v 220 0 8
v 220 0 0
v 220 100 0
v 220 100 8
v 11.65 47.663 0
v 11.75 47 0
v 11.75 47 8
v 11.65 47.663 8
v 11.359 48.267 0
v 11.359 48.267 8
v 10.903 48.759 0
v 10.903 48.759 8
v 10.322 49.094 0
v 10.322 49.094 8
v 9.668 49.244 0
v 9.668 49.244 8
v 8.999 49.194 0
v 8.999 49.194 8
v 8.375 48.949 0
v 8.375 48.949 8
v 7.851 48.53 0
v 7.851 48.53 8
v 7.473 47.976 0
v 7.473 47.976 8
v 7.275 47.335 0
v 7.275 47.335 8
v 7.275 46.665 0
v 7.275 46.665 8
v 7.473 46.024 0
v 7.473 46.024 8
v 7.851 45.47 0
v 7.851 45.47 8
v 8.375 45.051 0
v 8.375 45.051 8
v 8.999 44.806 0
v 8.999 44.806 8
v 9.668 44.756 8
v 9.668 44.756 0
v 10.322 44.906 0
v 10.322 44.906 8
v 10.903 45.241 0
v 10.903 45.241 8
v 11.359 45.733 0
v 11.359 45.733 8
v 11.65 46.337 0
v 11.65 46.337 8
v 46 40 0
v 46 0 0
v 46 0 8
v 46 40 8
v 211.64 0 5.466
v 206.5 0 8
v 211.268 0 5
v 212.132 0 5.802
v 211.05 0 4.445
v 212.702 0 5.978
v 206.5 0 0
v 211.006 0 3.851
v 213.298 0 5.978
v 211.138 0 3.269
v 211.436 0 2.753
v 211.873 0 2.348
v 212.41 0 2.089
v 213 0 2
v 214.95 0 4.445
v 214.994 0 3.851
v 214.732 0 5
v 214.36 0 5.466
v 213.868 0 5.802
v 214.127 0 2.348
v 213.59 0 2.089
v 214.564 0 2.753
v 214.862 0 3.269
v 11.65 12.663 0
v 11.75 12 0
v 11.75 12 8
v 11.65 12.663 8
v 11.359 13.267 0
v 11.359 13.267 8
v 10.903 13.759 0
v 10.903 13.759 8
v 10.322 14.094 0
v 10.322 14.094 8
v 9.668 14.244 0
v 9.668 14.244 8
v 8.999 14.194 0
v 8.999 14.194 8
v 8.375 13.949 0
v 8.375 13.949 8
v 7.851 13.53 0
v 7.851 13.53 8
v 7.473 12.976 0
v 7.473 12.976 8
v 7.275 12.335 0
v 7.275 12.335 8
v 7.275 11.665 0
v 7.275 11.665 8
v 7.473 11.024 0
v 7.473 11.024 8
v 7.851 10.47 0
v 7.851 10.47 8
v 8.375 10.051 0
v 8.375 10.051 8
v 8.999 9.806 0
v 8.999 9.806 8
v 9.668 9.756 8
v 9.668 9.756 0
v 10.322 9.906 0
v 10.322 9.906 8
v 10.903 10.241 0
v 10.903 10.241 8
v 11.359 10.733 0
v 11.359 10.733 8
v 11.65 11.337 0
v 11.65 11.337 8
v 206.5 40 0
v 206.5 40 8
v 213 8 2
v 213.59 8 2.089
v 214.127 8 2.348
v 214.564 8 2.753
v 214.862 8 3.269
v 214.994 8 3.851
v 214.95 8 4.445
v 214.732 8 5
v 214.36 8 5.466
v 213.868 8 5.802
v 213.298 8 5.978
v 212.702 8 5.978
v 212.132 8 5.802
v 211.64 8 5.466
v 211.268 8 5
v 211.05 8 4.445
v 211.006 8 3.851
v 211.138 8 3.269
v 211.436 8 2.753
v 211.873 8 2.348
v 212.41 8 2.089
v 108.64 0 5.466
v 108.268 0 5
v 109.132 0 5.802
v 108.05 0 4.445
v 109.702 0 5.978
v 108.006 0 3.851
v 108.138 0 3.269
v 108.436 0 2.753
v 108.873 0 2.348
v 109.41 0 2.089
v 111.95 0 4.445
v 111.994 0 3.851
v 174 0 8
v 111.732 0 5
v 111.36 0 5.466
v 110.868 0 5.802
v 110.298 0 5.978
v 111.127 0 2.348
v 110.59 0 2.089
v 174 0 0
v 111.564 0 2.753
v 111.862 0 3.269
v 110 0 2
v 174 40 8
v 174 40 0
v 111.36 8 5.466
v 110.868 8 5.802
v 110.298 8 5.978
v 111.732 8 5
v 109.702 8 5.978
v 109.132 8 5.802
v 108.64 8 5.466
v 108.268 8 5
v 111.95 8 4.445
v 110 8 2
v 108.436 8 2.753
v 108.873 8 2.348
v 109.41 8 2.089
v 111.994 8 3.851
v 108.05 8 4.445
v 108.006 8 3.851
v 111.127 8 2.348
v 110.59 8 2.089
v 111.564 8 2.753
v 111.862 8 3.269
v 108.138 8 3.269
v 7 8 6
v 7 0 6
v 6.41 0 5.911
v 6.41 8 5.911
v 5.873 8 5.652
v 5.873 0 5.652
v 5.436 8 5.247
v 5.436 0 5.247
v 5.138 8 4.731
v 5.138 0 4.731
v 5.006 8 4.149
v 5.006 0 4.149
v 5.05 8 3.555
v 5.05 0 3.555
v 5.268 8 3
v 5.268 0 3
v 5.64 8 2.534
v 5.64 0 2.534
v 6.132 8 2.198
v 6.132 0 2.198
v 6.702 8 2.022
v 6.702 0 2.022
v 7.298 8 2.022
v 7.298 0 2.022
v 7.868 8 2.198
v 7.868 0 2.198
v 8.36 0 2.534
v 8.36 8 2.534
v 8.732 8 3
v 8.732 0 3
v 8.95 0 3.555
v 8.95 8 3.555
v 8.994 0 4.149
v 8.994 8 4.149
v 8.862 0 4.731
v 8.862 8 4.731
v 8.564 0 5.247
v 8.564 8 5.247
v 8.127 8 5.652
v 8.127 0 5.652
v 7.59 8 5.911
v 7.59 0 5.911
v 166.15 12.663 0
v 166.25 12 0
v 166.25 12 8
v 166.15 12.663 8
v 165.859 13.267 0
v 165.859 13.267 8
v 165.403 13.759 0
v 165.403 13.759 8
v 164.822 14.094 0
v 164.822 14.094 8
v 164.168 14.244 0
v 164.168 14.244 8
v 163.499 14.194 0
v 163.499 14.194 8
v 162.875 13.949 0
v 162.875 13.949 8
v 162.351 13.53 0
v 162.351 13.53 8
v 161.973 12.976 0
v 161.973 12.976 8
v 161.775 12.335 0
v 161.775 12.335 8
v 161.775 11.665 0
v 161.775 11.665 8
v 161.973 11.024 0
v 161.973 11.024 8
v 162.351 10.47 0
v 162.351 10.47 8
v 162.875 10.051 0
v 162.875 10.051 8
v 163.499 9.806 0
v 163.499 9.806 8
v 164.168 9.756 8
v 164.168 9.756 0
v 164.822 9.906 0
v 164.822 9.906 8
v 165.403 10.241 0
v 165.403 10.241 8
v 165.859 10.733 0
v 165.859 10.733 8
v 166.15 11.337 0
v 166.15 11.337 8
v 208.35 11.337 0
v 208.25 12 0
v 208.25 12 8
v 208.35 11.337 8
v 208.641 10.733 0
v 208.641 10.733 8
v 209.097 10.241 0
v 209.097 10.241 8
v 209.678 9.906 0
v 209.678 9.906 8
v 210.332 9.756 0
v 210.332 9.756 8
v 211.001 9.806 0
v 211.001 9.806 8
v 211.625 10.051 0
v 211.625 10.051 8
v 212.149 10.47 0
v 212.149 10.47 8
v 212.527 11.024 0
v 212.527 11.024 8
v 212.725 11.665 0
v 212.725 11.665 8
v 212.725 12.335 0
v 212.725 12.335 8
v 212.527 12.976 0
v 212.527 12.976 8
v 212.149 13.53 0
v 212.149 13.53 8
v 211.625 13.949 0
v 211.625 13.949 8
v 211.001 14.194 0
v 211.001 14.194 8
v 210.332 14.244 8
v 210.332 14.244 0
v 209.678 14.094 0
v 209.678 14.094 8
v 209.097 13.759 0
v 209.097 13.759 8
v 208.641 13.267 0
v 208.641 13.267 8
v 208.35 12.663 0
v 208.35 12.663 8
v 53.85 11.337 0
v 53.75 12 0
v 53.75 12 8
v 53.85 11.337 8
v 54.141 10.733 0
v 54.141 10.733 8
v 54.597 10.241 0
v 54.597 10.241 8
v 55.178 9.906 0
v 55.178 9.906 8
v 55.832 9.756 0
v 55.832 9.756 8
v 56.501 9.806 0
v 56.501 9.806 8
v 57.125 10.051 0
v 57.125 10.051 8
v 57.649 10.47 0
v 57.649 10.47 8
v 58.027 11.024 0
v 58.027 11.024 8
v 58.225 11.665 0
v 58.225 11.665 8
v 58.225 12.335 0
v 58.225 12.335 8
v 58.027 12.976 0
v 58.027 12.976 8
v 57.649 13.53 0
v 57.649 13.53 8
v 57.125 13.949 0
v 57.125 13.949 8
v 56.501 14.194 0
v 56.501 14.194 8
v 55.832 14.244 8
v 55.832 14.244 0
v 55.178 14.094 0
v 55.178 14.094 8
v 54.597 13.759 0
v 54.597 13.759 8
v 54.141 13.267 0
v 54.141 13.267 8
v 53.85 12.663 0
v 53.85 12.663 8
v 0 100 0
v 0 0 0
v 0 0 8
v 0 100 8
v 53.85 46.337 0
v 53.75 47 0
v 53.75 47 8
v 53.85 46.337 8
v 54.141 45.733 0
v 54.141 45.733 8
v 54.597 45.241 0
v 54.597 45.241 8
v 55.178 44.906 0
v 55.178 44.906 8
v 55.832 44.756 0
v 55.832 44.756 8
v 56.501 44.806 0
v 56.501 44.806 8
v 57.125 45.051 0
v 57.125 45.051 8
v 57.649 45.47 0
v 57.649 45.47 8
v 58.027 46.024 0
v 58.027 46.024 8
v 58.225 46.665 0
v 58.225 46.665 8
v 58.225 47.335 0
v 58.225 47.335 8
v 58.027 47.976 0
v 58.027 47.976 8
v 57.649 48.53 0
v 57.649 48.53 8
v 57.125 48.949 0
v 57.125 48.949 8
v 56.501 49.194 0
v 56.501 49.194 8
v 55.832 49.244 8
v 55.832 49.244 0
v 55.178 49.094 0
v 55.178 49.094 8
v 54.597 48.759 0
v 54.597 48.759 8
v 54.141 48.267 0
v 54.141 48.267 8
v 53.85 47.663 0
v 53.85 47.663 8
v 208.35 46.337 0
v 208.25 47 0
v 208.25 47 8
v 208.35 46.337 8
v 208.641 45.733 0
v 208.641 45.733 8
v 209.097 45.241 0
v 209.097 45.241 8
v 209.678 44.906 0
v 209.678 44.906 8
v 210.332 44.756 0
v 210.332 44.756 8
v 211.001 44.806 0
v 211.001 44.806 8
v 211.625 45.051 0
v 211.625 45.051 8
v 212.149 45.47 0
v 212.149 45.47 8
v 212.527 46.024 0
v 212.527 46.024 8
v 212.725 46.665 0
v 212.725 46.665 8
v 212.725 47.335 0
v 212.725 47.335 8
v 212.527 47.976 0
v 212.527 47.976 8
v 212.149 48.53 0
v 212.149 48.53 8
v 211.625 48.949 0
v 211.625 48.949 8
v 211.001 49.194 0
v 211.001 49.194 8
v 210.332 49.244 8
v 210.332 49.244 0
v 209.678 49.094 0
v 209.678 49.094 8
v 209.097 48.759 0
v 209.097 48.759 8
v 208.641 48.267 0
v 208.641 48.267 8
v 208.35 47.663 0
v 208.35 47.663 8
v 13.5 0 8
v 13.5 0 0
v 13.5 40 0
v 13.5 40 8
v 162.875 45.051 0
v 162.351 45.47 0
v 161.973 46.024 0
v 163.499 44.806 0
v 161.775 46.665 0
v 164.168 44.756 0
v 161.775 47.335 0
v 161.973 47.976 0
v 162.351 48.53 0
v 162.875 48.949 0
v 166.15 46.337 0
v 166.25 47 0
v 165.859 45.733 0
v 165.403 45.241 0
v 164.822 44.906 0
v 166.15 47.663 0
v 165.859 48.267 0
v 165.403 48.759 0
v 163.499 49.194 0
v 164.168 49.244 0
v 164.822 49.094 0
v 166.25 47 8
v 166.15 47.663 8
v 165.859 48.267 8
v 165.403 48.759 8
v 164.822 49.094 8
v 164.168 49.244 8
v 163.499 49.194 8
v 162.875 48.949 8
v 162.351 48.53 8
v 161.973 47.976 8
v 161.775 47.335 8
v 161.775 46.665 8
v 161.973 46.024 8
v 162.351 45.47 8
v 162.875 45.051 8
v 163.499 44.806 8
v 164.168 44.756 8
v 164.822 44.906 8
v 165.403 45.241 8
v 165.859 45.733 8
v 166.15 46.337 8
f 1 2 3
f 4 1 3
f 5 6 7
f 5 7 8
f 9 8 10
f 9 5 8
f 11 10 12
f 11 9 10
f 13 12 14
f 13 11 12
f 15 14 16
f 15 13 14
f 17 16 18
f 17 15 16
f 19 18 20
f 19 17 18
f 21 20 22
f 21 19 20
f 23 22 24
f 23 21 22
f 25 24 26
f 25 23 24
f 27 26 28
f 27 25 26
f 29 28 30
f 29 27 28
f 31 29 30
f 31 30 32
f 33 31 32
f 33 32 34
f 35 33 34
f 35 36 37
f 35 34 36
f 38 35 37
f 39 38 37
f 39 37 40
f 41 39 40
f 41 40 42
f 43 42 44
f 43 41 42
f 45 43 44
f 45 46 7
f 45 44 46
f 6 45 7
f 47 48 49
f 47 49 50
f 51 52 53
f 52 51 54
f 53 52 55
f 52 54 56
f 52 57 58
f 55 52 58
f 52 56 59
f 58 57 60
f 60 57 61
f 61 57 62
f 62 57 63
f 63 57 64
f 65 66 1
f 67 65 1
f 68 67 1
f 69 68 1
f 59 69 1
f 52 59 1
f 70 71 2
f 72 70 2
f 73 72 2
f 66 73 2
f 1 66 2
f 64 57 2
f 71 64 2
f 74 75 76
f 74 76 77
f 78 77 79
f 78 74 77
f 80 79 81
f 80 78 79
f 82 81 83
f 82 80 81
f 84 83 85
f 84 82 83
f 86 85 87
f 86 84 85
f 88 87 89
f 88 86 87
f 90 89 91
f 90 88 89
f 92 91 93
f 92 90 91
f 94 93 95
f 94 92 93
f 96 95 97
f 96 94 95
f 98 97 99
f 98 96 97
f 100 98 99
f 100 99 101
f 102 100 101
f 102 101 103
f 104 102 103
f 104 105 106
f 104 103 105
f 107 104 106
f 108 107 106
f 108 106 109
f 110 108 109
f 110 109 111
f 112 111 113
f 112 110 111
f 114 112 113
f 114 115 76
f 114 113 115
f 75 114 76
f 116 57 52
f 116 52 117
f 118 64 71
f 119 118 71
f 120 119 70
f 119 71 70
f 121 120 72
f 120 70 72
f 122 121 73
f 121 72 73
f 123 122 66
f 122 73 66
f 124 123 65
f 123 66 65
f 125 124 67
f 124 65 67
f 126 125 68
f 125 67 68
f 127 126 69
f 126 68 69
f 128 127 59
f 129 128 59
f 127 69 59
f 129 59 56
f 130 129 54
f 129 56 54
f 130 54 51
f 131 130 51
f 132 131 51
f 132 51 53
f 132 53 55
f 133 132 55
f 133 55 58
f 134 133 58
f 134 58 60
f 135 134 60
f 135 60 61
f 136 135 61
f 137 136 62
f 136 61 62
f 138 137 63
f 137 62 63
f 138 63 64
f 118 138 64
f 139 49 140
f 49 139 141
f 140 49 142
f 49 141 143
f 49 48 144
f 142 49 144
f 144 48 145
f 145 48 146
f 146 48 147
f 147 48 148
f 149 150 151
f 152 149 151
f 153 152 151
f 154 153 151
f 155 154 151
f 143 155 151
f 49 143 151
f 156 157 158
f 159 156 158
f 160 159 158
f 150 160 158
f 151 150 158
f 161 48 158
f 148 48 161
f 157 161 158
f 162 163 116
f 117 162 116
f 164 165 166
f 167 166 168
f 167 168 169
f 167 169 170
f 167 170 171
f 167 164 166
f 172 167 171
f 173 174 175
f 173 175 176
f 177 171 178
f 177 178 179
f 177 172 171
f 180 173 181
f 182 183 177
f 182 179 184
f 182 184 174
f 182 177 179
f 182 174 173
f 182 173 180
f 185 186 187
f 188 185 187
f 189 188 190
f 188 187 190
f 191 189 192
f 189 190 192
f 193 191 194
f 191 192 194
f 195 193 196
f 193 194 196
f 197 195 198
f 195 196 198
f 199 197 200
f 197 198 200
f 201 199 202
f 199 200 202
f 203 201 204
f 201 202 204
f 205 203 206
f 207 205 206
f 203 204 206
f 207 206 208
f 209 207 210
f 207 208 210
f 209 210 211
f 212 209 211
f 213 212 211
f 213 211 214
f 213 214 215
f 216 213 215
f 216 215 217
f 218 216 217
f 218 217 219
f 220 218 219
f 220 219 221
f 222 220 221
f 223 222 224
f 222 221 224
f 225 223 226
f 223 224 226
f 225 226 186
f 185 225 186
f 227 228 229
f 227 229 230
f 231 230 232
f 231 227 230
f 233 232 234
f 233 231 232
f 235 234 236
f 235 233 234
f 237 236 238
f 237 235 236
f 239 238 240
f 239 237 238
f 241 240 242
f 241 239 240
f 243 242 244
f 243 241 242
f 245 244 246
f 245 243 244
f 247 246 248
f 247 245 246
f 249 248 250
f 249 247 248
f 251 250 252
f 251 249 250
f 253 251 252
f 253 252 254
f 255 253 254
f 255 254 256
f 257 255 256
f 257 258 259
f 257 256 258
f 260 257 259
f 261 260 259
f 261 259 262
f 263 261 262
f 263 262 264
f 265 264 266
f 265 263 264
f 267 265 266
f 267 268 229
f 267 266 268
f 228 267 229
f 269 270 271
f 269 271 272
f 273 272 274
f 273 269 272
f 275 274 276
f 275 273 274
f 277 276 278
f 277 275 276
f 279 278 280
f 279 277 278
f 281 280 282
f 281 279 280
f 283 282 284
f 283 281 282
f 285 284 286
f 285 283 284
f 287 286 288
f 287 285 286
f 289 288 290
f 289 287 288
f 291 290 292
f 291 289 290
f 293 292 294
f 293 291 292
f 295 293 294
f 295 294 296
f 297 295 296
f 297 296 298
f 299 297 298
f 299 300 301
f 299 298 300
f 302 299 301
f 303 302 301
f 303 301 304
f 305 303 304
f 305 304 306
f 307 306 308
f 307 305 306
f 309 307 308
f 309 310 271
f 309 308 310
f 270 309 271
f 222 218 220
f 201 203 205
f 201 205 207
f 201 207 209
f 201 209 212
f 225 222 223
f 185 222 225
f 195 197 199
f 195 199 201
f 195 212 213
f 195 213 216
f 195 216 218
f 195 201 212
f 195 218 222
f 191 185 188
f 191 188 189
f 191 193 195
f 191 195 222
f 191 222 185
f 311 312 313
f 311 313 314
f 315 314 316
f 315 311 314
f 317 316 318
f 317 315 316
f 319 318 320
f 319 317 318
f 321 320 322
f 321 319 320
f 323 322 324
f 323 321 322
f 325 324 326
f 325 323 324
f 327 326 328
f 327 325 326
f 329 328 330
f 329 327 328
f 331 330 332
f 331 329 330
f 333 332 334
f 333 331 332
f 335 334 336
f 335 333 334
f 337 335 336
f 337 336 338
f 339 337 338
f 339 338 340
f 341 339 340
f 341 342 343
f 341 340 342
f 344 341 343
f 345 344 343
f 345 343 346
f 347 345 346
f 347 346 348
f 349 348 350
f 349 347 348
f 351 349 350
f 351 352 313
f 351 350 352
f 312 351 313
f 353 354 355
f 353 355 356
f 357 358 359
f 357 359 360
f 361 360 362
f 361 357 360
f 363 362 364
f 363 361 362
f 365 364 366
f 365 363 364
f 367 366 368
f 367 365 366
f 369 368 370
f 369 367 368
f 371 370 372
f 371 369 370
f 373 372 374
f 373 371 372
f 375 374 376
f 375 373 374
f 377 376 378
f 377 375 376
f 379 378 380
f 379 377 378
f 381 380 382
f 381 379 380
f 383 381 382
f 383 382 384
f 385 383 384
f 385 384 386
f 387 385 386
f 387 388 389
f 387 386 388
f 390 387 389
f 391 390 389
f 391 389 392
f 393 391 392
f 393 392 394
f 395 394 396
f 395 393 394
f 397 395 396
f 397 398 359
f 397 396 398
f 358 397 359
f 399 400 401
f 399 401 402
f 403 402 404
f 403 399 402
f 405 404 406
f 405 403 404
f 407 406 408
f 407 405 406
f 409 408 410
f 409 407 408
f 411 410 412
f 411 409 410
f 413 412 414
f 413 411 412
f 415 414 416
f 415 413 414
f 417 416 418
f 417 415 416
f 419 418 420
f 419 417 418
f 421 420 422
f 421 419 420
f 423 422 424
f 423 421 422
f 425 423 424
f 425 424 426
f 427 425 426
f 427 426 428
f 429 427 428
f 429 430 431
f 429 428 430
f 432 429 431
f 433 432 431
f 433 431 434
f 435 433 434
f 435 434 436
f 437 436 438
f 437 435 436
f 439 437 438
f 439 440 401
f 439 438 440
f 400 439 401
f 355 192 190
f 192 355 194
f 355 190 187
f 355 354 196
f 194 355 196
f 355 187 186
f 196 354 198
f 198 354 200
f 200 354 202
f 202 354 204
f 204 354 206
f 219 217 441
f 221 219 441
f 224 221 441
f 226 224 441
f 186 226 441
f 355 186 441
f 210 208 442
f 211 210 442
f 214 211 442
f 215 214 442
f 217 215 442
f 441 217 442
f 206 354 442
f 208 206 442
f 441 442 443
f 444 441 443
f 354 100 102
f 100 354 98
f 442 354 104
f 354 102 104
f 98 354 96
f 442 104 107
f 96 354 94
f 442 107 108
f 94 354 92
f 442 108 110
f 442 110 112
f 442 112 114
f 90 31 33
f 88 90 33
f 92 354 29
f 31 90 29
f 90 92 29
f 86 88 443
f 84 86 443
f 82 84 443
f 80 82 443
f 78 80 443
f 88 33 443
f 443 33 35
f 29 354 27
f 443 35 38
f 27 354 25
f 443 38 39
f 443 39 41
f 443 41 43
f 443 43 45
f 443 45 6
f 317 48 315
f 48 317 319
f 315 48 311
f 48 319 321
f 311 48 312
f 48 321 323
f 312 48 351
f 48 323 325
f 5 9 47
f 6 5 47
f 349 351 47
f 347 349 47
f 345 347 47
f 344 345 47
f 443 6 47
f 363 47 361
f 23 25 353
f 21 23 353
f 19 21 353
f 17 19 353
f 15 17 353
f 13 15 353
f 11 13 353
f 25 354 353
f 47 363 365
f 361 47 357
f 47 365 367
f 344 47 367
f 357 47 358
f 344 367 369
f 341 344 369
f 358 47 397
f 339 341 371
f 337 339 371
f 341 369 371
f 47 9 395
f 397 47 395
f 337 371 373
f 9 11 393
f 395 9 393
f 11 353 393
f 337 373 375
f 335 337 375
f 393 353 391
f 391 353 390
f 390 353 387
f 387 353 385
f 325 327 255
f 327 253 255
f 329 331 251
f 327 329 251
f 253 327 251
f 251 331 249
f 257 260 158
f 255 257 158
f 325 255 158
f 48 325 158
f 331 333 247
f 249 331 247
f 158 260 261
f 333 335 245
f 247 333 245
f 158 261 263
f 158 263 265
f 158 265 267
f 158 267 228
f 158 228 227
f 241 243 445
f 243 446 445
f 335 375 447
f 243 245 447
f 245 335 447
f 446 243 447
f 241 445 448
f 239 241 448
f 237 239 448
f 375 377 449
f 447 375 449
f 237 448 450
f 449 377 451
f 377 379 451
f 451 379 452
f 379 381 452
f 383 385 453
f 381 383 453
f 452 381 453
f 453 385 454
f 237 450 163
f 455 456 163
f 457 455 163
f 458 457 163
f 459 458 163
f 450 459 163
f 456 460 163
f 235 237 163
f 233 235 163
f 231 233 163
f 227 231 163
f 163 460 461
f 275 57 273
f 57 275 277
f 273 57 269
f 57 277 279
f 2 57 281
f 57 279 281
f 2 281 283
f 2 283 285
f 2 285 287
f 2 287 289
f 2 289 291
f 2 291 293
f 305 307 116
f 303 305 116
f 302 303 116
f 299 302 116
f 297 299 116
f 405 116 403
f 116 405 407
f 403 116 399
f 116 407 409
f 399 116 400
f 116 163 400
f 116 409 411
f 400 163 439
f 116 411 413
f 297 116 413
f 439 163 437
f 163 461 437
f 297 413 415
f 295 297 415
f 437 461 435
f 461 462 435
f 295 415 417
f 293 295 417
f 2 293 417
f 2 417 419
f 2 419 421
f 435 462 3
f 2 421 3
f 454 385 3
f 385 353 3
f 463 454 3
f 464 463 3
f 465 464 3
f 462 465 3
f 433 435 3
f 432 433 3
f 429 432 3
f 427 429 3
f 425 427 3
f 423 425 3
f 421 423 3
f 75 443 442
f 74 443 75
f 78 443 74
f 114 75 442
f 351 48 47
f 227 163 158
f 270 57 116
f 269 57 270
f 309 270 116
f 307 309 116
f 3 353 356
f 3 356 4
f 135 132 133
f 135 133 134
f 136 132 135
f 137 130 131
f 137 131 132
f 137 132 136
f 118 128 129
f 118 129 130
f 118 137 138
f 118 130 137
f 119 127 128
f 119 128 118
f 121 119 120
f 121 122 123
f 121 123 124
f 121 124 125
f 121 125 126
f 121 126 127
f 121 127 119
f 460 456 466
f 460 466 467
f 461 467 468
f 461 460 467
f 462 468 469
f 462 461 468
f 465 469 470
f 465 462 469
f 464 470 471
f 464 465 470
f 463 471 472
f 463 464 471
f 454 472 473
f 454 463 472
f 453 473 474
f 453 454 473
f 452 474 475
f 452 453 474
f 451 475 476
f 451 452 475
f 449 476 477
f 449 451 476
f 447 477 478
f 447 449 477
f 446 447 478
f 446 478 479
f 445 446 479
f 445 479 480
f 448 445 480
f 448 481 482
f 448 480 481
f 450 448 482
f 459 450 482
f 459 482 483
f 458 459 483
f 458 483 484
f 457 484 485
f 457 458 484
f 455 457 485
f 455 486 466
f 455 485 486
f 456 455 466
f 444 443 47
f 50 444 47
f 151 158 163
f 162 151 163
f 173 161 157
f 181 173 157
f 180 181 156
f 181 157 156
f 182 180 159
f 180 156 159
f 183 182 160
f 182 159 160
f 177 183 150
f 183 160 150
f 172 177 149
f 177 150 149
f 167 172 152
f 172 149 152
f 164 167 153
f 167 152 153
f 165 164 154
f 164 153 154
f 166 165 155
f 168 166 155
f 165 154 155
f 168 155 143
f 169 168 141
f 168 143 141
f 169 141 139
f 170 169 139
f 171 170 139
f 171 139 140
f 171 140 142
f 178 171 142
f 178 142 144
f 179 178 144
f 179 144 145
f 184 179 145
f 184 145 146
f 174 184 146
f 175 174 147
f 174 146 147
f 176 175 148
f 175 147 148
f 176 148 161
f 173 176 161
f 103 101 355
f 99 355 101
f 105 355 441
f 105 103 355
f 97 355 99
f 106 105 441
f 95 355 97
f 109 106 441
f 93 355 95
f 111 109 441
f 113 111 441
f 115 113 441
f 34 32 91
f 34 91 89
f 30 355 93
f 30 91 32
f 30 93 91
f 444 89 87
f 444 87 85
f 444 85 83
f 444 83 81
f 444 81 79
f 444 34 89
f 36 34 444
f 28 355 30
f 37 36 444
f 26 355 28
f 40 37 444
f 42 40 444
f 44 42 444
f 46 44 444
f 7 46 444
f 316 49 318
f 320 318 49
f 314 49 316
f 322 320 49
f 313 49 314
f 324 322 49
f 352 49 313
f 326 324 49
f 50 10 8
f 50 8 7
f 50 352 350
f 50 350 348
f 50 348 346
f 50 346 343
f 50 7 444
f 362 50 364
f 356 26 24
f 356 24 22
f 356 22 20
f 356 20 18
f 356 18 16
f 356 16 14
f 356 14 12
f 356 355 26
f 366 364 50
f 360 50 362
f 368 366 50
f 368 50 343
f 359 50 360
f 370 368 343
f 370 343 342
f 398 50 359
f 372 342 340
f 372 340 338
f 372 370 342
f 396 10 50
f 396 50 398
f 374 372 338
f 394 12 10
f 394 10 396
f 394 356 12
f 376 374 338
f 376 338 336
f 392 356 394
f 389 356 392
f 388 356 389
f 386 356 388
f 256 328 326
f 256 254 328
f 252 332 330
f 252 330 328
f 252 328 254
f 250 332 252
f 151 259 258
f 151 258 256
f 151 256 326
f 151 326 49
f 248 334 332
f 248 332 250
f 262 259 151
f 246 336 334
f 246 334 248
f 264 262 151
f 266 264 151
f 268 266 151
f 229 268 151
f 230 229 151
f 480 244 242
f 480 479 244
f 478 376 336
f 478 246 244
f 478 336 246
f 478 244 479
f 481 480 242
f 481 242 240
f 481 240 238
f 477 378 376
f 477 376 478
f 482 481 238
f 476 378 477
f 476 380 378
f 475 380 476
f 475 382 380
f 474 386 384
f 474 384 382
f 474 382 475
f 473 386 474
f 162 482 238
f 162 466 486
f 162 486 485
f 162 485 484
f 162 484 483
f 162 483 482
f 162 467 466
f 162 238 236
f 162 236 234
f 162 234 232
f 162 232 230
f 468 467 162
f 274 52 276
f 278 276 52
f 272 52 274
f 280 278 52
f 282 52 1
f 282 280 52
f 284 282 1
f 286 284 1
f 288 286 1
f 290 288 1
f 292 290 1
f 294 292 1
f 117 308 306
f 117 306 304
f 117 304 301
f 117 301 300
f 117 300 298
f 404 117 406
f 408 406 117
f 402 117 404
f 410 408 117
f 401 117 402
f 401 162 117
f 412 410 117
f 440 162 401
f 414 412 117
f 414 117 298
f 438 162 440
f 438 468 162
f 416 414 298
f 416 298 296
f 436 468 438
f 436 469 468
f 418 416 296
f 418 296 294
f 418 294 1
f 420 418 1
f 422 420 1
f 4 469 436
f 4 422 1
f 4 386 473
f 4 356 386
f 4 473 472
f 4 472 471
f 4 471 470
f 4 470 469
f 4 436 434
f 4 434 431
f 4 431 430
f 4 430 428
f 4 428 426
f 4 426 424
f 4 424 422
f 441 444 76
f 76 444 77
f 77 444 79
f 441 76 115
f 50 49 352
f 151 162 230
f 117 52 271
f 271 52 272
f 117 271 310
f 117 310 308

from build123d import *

# Parameters (mm, degrees)
ESQUISSE1_W                  = 220
ESQUISSE1_H                  = 100
BOSS_EXTRU_1_DEPTH           = 8
ESQUISSE2_R                  = 2
ENL_V_MAT_EXTRU_1_DEPTH      = 8
ENL_V_MAT_EXTRU_6_DEPTH      = 242.793300155
ENL_V_MAT_EXTRU_6_DEPTH_BACK = 242.793300155
ESQUISSE8_W                  = 32.5
ESQUISSE8_H                  = 40
ENL_V_MAT_EXTRU_8_DEPTH      = 242.793300155
ENL_V_MAT_EXTRU_8_DEPTH_BACK = 242.793300155
ESQUISSE10_R                 = 2.25


with BuildPart() as part:
    # Esquisse1 → Boss.-Extru.1 (new body)
    with BuildSketch(Plane.XY):
        with Locations((110, 50)):
            Rectangle(ESQUISSE1_W, ESQUISSE1_H)
    extrude(amount=BOSS_EXTRU_1_DEPTH)

    # Esquisse2 → Enlèv. mat.-Extru.1 (cut)
    with BuildSketch(Plane.XZ):
        with Locations(Location((110, 4, 0), (0, 0, 270))):
            Circle(ESQUISSE2_R)
        with Locations(Location((213, 4, 0), (0, 0, 270))):
            Circle(ESQUISSE2_R)
        with Locations(Location((7, 4, 0), (0, 0, 90))):
            Circle(ESQUISSE2_R)
    extrude(amount=-ENL_V_MAT_EXTRU_1_DEPTH, mode=Mode.SUBTRACT)

    # Esquisse8 → Enlèv. mat.-Extru.6 (cut, two sides: drawn at the far end of the back side and taken through both)
    with BuildSketch(Plane.XY.offset(8).offset(-ENL_V_MAT_EXTRU_6_DEPTH_BACK)):
        with Locations((190.25, 20)):
            Rectangle(ESQUISSE8_W, ESQUISSE8_H)
        with Locations((29.75, 20)):
            Rectangle(ESQUISSE8_W, ESQUISSE8_H)
    extrude(amount=ENL_V_MAT_EXTRU_6_DEPTH + ENL_V_MAT_EXTRU_6_DEPTH_BACK, mode=Mode.SUBTRACT)

    # Esquisse10 → Enlèv. mat.-Extru.8 (cut, two sides: drawn at the far end of the back side and taken through both)
    with BuildSketch(Plane.XY.offset(8).offset(-ENL_V_MAT_EXTRU_8_DEPTH_BACK)):
        with Locations((9.5, 12)):
            Circle(ESQUISSE10_R)
        with Locations((9.5, 47)):
            Circle(ESQUISSE10_R)
        with Locations(Location((210.5, 47, 0), (0, 0, 180))):
            Circle(ESQUISSE10_R)
        with Locations(Location((210.5, 12, 0), (0, 0, 180))):
            Circle(ESQUISSE10_R)
        with Locations(Location((56, 47, 0), (0, 0, 180))):
            Circle(ESQUISSE10_R)
        with Locations(Location((56, 12, 0), (0, 0, 180))):
            Circle(ESQUISSE10_R)
        with Locations((164, 12)):
            Circle(ESQUISSE10_R)
        with Locations((164, 47)):
            Circle(ESQUISSE10_R)
    extrude(amount=ENL_V_MAT_EXTRU_8_DEPTH + ENL_V_MAT_EXTRU_8_DEPTH_BACK, mode=Mode.SUBTRACT)


solid = part.part
